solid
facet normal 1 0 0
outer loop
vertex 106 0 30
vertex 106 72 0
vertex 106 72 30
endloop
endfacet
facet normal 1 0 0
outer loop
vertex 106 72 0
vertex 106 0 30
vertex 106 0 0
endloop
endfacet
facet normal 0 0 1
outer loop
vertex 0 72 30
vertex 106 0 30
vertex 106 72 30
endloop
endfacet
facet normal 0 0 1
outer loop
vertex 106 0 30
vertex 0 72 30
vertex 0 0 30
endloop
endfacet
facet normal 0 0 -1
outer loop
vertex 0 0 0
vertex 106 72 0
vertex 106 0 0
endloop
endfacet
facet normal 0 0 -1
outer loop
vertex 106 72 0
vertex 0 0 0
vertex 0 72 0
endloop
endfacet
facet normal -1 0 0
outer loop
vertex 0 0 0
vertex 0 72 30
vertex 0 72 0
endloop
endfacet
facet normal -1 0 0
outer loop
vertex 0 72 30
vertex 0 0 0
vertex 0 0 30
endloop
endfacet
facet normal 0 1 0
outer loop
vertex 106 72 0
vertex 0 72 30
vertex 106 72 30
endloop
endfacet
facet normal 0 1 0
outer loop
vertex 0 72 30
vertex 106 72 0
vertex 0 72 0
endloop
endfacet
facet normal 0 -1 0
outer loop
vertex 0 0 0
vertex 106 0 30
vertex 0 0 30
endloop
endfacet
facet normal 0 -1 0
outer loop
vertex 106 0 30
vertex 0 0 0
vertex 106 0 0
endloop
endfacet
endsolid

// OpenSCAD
// Bench Rack for 1.5 mL Microcentrifuge Tubes
// Designed for FDM 3D printing. Rests on XY plane at Z=0.

// --- Dimensions (mm) ---
// Block Dimensions
$block_length = 106; // X
$block_width  = 72;  // Y
$block_height = 30;  // Z

// Grid Configuration
$grid_rows = 4;      // Rows along Y
$grid_cols = 6;      // Columns along X
$grid_spacing_x = 16; // Centre-to-centre spacing X
$grid_spacing_y = 16; // Centre-to-centre spacing Y

// Hole Dimensions
$hole_diameter = 11.2;
$hole_depth    = 25; // Depth of the hole (from top surface)
$floor_height  = 5;  // Solid floor thickness (30 - 25)

// --- Variables ---
$fn = 64; // Resolution for curved shapes

// --- Main Module ---
module bench_rack() {
    // Calculate the offset to center the grid on the block
    // Center of block is (0,0). 
    // We want the first hole at x = -((cols-1)*spacing)/2
    
    $x_offset = -(($grid_cols - 1) * $grid_spacing_x / 2);
    $y_offset = -(($grid_rows - 1) * $grid_spacing_y / 2);

    // Create the holes by subtracting cylinders from the block
    // We use a loop to generate all holes
    for (col = [0 : $grid_cols - 1]) {
        for (row = [0 : $grid_rows - 1]) {
            
            // Calculate position of the hole center relative to block center
            $x_pos = $x_offset + (col * $grid_spacing_x);
            $y_pos = $y_offset + (row * $grid_spacing_y);
            
            // Define the hole geometry
            // We subtract a cylinder that is slightly larger than the hole diameter
            // to ensure clean cutting (Rule 5).
            $cut_diameter = $hole_diameter + 0.1; 
            $cut_radius = $cut_diameter / 2;
            
            // The hole is open at the top (Z = $block_height) and goes down to Z = $floor_height
            // In OpenSCAD, cylinder height is along Z by default.
            // We position the cylinder so its top is at the block top.
            // Cylinder center Z = Top_Z - (Height / 2)
            $z_pos = ($block_height / 2) - ($hole_depth / 2);
            
            difference() {
                // Start with the solid block
                translate([0, 0, 0]) 
                    cube([
                        $block_length,
                        $block_width,
                        $block_height
                    ]);
                
                // Subtract the hole
                translate([
                    $x_pos, 
                    $y_pos, 
                    $z_pos
                ]) 
                    cylinder(
                        h = $hole_depth,
                        r = $cut_radius,
                        $fn = $fn
                    );
            }
        }
    }
}

// Instantiate the part
bench_rack();
